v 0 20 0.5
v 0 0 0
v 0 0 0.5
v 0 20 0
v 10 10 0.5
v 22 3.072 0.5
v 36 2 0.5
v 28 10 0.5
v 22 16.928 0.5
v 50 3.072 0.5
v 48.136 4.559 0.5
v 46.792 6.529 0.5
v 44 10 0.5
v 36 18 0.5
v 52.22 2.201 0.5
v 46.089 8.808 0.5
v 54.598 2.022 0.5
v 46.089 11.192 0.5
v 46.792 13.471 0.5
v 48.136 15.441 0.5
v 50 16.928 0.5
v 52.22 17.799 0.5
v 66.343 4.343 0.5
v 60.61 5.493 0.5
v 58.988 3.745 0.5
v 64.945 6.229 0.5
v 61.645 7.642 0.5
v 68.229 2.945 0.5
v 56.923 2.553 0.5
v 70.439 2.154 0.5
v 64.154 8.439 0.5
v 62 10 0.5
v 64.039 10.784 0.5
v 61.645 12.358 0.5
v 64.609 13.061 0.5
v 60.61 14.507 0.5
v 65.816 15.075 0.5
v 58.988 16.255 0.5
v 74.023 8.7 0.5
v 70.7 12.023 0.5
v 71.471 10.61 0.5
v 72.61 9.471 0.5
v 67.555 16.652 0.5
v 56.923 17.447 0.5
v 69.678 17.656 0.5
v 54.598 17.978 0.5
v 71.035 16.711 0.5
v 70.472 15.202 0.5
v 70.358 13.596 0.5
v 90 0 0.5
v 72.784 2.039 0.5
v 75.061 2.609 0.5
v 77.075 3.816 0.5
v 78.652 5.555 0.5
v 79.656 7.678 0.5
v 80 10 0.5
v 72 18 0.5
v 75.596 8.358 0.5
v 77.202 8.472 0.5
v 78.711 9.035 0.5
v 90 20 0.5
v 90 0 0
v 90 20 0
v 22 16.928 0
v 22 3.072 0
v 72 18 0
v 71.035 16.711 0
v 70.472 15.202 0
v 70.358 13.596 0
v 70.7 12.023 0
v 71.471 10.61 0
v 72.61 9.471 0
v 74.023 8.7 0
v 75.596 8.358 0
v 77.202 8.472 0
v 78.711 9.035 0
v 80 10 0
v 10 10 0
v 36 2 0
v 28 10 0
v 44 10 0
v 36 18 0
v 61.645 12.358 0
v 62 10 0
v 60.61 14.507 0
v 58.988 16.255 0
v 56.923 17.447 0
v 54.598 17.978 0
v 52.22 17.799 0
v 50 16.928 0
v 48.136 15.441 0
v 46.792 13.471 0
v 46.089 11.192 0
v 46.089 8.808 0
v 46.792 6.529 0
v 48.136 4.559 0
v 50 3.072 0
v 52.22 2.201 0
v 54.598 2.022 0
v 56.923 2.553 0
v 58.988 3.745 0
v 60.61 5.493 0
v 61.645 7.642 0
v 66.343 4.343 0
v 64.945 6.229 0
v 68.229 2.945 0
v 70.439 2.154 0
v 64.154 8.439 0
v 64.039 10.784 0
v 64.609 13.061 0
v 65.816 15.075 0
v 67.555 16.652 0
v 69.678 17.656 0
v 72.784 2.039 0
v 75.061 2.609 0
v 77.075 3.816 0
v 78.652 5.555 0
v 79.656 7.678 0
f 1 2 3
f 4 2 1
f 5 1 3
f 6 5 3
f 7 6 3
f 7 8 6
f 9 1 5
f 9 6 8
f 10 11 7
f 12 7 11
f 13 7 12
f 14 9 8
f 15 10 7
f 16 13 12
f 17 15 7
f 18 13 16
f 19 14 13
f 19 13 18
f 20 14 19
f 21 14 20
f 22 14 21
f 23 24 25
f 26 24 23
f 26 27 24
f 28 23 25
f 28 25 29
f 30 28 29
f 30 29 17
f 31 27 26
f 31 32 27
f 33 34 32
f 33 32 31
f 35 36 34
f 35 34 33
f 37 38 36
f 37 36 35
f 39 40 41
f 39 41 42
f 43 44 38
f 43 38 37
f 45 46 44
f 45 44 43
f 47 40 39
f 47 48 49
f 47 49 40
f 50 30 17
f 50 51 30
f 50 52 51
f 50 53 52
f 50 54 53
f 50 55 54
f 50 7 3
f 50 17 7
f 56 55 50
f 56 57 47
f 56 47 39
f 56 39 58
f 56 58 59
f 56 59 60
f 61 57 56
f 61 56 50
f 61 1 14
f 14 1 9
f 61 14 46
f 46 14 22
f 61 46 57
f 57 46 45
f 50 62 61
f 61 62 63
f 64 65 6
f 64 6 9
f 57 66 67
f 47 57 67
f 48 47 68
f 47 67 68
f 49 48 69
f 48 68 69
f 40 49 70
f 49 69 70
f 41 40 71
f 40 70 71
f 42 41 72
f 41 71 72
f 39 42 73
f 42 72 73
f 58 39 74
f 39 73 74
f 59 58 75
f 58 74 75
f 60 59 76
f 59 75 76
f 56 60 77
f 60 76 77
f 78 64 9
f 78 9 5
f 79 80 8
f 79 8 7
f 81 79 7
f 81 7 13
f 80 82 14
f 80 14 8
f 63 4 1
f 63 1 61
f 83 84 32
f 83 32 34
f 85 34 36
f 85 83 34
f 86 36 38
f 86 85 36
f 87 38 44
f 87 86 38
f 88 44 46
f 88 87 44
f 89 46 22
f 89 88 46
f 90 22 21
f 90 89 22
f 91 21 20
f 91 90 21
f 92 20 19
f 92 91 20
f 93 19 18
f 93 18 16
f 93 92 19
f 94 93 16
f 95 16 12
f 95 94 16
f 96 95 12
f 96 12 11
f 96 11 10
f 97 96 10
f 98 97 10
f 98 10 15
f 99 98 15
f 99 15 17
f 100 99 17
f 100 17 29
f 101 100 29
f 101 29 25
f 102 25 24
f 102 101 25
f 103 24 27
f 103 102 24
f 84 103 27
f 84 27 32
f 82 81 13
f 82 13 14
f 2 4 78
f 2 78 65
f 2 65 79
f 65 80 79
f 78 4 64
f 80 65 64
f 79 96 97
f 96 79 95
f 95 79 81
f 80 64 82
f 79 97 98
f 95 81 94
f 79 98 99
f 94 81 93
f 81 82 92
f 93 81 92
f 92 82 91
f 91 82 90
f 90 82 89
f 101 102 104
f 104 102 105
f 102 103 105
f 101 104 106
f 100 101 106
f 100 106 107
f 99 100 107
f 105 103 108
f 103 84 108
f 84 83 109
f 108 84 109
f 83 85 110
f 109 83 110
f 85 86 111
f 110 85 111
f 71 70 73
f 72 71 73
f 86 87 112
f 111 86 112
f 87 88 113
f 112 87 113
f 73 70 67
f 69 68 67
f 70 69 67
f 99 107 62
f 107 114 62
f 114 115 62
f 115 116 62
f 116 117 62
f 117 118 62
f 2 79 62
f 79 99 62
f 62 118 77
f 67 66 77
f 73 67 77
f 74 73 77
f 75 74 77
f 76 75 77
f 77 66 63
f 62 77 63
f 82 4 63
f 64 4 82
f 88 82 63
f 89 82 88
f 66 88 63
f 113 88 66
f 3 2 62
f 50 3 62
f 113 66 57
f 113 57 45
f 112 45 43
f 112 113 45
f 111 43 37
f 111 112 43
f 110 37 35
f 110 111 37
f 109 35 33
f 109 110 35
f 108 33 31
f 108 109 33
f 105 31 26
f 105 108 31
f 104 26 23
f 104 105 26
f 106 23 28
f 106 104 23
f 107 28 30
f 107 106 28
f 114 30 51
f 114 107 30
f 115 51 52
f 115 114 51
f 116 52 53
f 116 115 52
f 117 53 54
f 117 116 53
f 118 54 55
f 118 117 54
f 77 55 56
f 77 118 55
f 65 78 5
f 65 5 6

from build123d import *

# Parameters (mm, degrees)
SKETCH_W  = 90
SKETCH_H  = 20
SKETCH_R  = 8
PAD_DEPTH = 0.5


with BuildPart() as part:
    # Sketch → Pad (new body)
    with BuildSketch(Plane.XY):
        with Locations((45, 10)):
            Rectangle(SKETCH_W, SKETCH_H)
        with Locations((54, 10)):
            Circle(SKETCH_R, mode=Mode.SUBTRACT)
        Polygon((44, 10), (36, 18), (28, 10), (36, 2), align=None, mode=Mode.SUBTRACT)
        with BuildLine():
            ThreePointArc((72, 18), (66.343146, 4.343146), (80, 10))
            ThreePointArc((72, 18), (72, 10), (80, 10))
        make_face(mode=Mode.SUBTRACT)
        Polygon((22, 3.071824), (22, 16.92823), (10, 10.000027), align=None, mode=Mode.SUBTRACT)
    extrude(amount=PAD_DEPTH)


solid = part.part
